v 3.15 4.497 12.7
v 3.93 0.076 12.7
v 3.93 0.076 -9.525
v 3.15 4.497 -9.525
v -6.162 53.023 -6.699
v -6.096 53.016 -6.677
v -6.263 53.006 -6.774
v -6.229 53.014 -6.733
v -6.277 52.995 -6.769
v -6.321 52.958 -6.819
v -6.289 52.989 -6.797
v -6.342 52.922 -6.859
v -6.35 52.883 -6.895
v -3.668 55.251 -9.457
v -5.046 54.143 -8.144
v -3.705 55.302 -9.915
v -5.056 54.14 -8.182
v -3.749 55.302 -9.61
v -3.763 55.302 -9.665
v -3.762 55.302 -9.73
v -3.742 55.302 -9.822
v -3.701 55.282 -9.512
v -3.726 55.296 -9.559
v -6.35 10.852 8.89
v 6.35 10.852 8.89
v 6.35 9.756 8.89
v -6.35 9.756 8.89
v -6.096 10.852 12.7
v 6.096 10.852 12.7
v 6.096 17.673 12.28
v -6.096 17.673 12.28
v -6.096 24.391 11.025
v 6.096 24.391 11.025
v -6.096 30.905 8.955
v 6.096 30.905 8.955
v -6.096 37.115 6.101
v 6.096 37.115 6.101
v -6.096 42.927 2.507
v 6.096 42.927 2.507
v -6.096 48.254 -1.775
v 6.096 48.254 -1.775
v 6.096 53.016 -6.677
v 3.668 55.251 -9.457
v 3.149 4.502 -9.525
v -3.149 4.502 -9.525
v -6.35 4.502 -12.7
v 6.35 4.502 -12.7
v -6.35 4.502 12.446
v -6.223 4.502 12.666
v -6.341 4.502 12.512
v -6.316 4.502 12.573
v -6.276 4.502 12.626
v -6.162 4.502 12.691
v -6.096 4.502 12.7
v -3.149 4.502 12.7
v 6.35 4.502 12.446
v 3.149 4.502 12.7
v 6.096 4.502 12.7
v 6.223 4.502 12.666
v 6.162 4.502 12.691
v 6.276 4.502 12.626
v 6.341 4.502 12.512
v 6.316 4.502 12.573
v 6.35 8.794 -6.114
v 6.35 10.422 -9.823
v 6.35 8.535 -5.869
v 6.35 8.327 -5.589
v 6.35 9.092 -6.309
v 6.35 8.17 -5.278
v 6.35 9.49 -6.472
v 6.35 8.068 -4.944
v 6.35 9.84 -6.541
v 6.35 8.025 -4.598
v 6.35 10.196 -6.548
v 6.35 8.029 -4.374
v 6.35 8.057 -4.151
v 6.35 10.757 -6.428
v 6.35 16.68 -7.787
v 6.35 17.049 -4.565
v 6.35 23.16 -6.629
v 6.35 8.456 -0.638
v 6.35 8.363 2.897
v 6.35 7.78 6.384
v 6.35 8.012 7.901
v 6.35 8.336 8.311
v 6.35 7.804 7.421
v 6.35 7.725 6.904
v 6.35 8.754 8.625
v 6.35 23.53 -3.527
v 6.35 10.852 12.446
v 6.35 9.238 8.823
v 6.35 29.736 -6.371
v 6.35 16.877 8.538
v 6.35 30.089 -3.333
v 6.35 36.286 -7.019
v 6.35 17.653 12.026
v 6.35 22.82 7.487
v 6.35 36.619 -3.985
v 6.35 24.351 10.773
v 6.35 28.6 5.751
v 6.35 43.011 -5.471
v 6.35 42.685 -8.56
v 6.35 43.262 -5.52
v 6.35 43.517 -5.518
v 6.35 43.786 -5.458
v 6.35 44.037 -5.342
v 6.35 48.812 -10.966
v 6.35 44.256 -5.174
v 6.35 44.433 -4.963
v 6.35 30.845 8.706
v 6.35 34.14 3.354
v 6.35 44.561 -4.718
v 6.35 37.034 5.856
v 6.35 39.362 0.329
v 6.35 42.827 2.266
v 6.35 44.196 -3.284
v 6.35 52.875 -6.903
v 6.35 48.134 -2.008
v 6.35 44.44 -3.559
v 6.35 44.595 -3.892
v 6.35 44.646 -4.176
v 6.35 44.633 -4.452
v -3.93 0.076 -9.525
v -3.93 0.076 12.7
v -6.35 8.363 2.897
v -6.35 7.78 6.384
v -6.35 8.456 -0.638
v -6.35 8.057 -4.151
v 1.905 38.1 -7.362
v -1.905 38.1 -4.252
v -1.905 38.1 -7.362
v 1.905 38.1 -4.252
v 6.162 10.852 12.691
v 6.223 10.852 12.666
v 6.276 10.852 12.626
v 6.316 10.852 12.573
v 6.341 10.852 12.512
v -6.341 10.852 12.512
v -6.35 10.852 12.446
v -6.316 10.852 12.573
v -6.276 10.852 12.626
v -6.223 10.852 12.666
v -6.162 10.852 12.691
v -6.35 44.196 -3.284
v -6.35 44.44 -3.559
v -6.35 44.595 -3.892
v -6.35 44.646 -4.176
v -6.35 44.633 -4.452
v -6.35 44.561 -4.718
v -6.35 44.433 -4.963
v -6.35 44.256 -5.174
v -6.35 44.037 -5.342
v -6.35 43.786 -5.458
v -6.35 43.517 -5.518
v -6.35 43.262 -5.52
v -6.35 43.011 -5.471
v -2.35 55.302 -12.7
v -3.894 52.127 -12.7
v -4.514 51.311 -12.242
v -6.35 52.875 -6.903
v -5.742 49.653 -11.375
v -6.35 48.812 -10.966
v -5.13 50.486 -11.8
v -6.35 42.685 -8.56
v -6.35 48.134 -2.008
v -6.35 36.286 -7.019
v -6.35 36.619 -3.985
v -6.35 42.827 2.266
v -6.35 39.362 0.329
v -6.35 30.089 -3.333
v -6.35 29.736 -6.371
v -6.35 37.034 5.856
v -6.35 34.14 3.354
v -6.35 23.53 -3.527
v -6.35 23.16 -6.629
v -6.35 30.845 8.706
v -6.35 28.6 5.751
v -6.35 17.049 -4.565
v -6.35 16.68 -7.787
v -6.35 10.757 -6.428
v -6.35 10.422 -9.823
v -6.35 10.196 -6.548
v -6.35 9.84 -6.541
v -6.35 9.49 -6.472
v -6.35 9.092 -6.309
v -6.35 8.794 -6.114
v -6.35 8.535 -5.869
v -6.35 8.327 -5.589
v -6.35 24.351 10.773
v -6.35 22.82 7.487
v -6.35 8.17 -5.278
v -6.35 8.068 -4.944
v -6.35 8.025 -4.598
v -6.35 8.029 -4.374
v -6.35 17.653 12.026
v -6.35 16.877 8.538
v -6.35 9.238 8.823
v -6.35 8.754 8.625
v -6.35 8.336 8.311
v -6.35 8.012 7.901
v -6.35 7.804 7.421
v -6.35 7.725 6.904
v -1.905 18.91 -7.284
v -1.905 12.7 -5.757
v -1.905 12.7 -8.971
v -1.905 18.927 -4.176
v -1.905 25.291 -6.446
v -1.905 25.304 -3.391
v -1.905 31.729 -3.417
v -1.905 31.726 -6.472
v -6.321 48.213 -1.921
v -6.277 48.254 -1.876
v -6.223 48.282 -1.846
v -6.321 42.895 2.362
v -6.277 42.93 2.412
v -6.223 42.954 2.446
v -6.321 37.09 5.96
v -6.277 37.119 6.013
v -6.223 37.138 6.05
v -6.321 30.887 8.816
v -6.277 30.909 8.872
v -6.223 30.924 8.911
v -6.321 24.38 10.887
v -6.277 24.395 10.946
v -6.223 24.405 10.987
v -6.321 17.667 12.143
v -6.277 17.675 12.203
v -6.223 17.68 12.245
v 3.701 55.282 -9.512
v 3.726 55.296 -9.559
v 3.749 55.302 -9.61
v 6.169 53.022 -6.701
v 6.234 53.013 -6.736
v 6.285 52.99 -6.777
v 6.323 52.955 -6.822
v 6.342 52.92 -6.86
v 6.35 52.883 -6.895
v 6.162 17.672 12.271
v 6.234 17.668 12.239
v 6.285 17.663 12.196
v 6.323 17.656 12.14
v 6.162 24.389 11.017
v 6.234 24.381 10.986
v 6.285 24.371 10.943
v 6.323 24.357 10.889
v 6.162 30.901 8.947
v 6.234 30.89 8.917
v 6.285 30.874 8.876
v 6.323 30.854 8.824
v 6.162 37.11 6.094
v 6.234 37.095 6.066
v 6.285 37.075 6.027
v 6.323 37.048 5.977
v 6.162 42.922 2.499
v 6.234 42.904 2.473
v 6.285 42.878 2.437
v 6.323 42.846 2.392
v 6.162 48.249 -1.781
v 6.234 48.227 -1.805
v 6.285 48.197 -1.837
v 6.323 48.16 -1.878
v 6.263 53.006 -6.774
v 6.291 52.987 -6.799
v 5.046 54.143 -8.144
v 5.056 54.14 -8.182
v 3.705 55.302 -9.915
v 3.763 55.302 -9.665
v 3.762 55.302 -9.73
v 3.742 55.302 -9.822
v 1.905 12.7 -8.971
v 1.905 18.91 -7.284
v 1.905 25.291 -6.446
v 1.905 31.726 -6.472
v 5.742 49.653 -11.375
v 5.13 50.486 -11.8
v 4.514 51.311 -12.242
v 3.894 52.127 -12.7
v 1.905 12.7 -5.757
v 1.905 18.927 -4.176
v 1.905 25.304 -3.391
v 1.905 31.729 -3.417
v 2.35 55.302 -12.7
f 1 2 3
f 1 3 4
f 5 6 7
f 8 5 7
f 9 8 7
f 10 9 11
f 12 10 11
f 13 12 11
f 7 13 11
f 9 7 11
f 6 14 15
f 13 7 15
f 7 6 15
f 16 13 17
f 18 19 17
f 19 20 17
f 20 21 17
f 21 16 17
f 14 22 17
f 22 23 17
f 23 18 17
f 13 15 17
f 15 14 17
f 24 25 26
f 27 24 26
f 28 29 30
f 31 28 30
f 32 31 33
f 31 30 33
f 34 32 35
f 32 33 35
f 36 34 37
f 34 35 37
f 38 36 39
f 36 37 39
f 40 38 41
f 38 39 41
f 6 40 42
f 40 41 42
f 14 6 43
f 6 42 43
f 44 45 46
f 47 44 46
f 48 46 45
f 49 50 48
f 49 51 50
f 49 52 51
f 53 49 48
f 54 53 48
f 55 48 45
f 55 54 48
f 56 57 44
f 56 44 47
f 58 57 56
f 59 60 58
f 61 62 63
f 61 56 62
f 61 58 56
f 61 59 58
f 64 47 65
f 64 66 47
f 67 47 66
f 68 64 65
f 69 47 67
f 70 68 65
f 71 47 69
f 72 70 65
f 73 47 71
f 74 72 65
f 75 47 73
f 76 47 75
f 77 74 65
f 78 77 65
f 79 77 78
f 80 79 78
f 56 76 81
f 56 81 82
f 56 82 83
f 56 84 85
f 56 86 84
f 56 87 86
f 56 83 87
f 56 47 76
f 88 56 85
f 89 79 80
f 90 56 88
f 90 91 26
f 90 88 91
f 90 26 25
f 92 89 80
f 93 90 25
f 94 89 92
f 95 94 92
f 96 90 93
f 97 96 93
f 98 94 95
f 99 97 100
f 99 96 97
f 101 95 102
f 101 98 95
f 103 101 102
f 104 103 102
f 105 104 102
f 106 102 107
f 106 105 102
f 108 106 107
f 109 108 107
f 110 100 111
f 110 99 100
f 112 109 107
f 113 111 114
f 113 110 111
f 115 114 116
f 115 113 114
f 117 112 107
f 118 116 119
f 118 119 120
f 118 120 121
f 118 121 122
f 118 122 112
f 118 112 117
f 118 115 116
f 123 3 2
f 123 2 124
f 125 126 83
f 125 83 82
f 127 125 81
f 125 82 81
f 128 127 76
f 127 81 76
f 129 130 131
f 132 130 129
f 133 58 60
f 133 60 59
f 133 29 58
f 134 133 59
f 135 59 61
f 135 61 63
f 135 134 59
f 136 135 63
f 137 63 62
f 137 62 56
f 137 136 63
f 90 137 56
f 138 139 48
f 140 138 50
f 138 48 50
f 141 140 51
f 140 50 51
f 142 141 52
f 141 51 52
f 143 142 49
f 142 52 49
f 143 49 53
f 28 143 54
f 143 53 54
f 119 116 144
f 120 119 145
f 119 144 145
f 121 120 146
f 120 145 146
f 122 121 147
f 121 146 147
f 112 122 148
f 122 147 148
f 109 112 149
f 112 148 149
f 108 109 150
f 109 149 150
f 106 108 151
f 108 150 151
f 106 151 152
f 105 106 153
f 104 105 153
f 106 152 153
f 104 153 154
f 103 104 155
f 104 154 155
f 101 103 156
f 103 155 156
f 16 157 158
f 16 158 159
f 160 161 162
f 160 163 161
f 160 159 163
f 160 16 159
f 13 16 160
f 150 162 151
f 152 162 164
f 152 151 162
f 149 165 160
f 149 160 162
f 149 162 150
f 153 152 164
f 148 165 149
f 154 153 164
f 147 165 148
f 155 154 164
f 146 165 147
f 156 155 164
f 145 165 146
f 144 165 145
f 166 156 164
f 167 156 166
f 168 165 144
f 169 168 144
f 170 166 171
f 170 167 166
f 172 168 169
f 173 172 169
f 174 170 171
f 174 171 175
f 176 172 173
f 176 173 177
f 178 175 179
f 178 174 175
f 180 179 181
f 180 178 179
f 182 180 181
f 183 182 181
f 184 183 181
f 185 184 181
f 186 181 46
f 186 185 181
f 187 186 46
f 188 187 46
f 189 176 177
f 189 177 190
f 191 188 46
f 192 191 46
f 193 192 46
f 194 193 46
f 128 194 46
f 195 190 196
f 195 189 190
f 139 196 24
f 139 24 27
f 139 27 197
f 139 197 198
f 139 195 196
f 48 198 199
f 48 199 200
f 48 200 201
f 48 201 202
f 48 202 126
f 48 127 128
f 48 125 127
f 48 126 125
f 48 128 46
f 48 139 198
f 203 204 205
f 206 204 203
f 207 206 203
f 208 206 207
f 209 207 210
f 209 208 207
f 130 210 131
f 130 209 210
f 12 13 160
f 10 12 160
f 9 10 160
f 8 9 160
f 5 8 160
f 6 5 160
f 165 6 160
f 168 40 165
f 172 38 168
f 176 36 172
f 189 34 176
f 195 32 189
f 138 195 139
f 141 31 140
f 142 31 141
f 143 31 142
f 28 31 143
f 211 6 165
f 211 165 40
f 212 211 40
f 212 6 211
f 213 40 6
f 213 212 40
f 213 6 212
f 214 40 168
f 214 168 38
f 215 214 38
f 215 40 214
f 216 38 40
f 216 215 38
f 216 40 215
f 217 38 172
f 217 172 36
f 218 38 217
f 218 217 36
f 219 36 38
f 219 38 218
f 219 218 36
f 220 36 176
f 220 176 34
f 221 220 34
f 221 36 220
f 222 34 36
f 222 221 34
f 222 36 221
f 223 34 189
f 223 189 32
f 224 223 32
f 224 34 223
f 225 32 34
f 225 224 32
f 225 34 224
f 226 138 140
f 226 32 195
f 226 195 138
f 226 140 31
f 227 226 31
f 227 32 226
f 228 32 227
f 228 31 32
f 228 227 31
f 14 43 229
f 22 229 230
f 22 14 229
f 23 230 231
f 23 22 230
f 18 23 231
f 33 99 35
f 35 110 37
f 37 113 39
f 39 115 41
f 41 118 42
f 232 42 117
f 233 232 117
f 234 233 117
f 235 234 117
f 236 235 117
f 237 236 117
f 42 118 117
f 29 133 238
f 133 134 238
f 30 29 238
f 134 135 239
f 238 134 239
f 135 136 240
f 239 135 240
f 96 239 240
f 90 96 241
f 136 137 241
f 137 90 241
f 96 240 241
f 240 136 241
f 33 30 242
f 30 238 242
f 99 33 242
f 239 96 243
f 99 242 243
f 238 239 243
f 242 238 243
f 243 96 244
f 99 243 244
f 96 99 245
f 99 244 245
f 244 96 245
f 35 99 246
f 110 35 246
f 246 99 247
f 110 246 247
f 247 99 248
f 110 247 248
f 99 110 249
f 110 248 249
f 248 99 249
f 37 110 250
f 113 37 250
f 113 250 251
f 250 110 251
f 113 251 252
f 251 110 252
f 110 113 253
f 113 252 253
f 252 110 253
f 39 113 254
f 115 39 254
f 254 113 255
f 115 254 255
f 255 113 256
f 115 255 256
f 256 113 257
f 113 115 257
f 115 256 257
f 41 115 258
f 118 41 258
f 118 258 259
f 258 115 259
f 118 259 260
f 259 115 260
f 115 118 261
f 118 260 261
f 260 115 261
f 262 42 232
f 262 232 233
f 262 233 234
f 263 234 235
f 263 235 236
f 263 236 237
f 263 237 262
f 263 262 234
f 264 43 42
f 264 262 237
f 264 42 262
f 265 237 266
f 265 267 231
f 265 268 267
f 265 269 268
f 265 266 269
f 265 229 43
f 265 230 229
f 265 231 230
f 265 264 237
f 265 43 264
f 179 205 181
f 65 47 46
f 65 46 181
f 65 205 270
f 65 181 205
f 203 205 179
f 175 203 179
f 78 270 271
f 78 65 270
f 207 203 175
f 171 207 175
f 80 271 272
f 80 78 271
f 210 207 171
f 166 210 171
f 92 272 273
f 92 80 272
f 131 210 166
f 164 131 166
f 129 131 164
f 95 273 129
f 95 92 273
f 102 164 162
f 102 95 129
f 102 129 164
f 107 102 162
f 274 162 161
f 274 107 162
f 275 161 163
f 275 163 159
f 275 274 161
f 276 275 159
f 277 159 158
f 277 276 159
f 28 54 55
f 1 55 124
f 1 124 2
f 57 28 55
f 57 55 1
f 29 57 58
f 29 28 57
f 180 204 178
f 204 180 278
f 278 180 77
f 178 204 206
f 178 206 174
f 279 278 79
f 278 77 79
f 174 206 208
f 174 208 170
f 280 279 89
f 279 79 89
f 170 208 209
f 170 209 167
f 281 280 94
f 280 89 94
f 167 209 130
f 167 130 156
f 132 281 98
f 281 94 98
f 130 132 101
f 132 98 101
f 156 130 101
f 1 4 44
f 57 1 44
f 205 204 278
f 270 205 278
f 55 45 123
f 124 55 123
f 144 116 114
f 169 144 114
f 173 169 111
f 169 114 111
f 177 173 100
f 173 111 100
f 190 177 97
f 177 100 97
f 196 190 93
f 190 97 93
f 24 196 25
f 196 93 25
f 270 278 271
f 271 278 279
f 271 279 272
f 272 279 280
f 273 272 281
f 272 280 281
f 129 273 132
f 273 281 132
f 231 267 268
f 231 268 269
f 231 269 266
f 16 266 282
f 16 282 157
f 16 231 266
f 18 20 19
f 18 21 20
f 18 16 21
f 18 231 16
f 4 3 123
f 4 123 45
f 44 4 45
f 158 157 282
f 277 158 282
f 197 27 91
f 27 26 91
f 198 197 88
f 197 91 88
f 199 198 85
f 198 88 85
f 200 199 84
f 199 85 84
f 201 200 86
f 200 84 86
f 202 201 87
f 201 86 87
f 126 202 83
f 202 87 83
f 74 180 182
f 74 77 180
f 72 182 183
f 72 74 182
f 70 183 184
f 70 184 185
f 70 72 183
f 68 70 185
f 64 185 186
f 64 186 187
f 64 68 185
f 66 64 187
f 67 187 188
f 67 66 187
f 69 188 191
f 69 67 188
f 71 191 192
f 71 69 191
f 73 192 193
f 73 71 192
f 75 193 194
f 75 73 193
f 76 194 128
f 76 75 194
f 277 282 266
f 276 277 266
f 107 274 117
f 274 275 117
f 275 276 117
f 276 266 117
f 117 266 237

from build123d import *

# Parameters (mm, degrees)
BOSS_EXTRUDE1_DEPTH   = 12.7
KES_EKSTR_ZYON1_DEPTH = 22.86
SKETCH3_W             = 3.175
SKETCH3_H             = 4.501579944
KES_EKSTR_ZYON2_DEPTH = 22.86
KES_EKSTR_ZYON3_DEPTH = 22.86
KES_EKSTR_ZYON4_DEPTH = 11.43
RADYUS1_R             = 2.032
RADYUS2_R             = 1.27
IZIM2_W               = 3.81
IZIM2_H               = 25.4
KES_EKSTR_ZYON5_DEPTH = 22.86
IZIM3_W               = 8.451203014
IZIM3_H               = 0.1524
KES_EKSTR_ZYON6_DEPTH = 22.86
KES_EKSTR_ZYON7_DEPTH = 22.86
KES_EKSTR_ZYON8_DEPTH = 22.86
RADYUS3_R             = 0.254


with BuildPart() as part:
    # Sketch1 → Boss-Extrude1 (new, symmetric)
    with BuildSketch(Plane.XY):
        Polygon((-3.96875, 0), (3.96875, 0), (3.175, 4.501579944), (6.35, 4.501579944), (6.35, 55.301579944), (-6.35, 55.301579944), (-6.35, 4.501579944), (-3.175, 4.501579944), align=None)
    extrude(amount=BOSS_EXTRUDE1_DEPTH, both=True)

    # Sketch2 → Kes-Ekstrüzyon1 (cut)
    with BuildSketch(Plane(origin=(6.35, 0, 0), x_dir=(0, 0, -1), z_dir=(1, 0, 0))):
        with BuildLine():
            Line((9.525, 55.301579944), (-12.7, 55.301579944))
            Line((-12.7, 55.301579944), (-12.7, 10.851579944))
            ThreePointArc((-12.7, 10.851579944), (-6.8341108, 35.699885344), (9.525, 55.301579944))
        make_face()
    extrude(amount=-KES_EKSTR_ZYON1_DEPTH, mode=Mode.SUBTRACT)

    # Sketch3 → Kes-Ekstrüzyon2 (cut)
    with BuildSketch(Plane(origin=(6.35, 0, 0), x_dir=(0, 0, -1), z_dir=(1, 0, 0))):
        with Locations((11.1125, 2.250789972)):
            Rectangle(SKETCH3_W, SKETCH3_H)
    extrude(amount=-KES_EKSTR_ZYON2_DEPTH, mode=Mode.SUBTRACT)

    # Sketch4 → Kes-Ekstrüzyon3 (cut)
    with BuildSketch(Plane(origin=(6.35, 0, 0), x_dir=(0, 0, -1), z_dir=(1, 0, 0))):
        with BuildLine():
            Line((12.7, 52.126579944), (12.7, 4.501579944))
            ThreePointArc((12.7, 4.501579944), (6.35, 28.314079944), (12.7, 52.126579944))
        make_face()
    extrude(amount=-KES_EKSTR_ZYON3_DEPTH, mode=Mode.SUBTRACT)

    # Çizim1 → Kes-Ekstrüzyon4 (cut, symmetric)
    with BuildSketch(Plane(origin=(0, 0, 0), x_dir=(0, 0, -1), z_dir=(1, 0, 0))):
        with BuildLine():
            Line((-8.89, 10.851579944), (-8.89, 7.041579944))
            ThreePointArc((-8.89, 7.041579944), (-0.463388354, 8.480106364), (7.963223293, 7.041579944))
            ThreePointArc((7.963223293, 7.041579944), (3.304329022, 27.827298707), (7.564597424, 48.698367522))
            ThreePointArc((7.564597424, 48.698367522), (-4.598410017, 31.486096575), (-8.89, 10.851579944))
        make_face()
    extrude(amount=KES_EKSTR_ZYON4_DEPTH, both=True, mode=Mode.SUBTRACT)

    # Radyus1
    radyus1_edges = [part.edges().sort_by_distance(p)[0] for p in [
        (0, 7.041579944, -7.963223293),
        (0, 7.041579944, 8.89),
    ]]
    fillet(radyus1_edges, radius=RADYUS1_R)

    # Radyus2
    radyus2_edges = [part.edges().sort_by_distance(p)[0] for p in [
        (0, 48.698367522, -7.564597424),
    ]]
    fillet(radyus2_edges, radius=RADYUS2_R)

    # Çizim2 → Kes-Ekstrüzyon5 (cut)
    with BuildSketch(Plane.XY.offset(-2.54)):
        with Locations((0, 25.4)):
            Rectangle(IZIM2_W, IZIM2_H)
    extrude(amount=-KES_EKSTR_ZYON5_DEPTH, mode=Mode.SUBTRACT)

    # Çizim3 → Kes-Ekstrüzyon6 (cut)
    with BuildSketch(Plane(origin=(0, 0, -9.525), x_dir=(-1, 0, 0), z_dir=(0, 0, -1))):
        Rectangle(IZIM3_W, IZIM3_H)
    extrude(amount=-KES_EKSTR_ZYON6_DEPTH, mode=Mode.SUBTRACT)

    # Çizim4 → Kes-Ekstrüzyon7 (cut)
    with BuildSketch(Plane(origin=(0, 0, -9.525), x_dir=(-1, 0, 0), z_dir=(0, 0, -1))):
        Polygon((3.149208164, 4.501579944), (3.943735883, -0.004410664), (3.96875, 0), (3.175, 4.501579944), align=None)
        Polygon((-3.943735883, -0.004410664), (-3.149985883, 4.497169281), (-3.149208164, 4.501579944), (-3.175, 4.501579944), (-3.96875, 0), align=None)
    extrude(amount=-KES_EKSTR_ZYON7_DEPTH, mode=Mode.SUBTRACT)

    # Çizim7 → Kes-Ekstrüzyon8 (cut)
    with BuildSketch(Plane(origin=(0, 23.270981508, 23.270981508), x_dir=(-1, 0, 0), z_dir=(0, 0.7071067811865464, 0.7071067811865488))):
        Polygon((2.349914846, -48.08437831), (8.542960799, -39.080976931), (8.542960799, -48.08437831), align=None)
        Polygon((-8.542960799, -48.08437831), (-2.349914846, -48.08437831), (-8.542960799, -39.080976931), align=None)
    extrude(amount=-KES_EKSTR_ZYON8_DEPTH, mode=Mode.SUBTRACT)

    # Radyus3
    radyus3_edges = [part.edges().sort_by_distance(p)[0] for p in [
        (6.35, 7.676579944, 12.7),
        (0, 55.301579944, -9.525),
        (-5.120609971, 54.200188902, -8.104917983),
        (5.120609971, 54.200188902, -8.104917983),
        (-6.35, 7.676579944, 12.7),
        (-6.35, 34.080615313, 7.611288466),
        (6.35, 34.080615313, 7.611288466),
    ]]
    fillet(radyus3_edges, radius=RADYUS3_R)


solid = part.part
